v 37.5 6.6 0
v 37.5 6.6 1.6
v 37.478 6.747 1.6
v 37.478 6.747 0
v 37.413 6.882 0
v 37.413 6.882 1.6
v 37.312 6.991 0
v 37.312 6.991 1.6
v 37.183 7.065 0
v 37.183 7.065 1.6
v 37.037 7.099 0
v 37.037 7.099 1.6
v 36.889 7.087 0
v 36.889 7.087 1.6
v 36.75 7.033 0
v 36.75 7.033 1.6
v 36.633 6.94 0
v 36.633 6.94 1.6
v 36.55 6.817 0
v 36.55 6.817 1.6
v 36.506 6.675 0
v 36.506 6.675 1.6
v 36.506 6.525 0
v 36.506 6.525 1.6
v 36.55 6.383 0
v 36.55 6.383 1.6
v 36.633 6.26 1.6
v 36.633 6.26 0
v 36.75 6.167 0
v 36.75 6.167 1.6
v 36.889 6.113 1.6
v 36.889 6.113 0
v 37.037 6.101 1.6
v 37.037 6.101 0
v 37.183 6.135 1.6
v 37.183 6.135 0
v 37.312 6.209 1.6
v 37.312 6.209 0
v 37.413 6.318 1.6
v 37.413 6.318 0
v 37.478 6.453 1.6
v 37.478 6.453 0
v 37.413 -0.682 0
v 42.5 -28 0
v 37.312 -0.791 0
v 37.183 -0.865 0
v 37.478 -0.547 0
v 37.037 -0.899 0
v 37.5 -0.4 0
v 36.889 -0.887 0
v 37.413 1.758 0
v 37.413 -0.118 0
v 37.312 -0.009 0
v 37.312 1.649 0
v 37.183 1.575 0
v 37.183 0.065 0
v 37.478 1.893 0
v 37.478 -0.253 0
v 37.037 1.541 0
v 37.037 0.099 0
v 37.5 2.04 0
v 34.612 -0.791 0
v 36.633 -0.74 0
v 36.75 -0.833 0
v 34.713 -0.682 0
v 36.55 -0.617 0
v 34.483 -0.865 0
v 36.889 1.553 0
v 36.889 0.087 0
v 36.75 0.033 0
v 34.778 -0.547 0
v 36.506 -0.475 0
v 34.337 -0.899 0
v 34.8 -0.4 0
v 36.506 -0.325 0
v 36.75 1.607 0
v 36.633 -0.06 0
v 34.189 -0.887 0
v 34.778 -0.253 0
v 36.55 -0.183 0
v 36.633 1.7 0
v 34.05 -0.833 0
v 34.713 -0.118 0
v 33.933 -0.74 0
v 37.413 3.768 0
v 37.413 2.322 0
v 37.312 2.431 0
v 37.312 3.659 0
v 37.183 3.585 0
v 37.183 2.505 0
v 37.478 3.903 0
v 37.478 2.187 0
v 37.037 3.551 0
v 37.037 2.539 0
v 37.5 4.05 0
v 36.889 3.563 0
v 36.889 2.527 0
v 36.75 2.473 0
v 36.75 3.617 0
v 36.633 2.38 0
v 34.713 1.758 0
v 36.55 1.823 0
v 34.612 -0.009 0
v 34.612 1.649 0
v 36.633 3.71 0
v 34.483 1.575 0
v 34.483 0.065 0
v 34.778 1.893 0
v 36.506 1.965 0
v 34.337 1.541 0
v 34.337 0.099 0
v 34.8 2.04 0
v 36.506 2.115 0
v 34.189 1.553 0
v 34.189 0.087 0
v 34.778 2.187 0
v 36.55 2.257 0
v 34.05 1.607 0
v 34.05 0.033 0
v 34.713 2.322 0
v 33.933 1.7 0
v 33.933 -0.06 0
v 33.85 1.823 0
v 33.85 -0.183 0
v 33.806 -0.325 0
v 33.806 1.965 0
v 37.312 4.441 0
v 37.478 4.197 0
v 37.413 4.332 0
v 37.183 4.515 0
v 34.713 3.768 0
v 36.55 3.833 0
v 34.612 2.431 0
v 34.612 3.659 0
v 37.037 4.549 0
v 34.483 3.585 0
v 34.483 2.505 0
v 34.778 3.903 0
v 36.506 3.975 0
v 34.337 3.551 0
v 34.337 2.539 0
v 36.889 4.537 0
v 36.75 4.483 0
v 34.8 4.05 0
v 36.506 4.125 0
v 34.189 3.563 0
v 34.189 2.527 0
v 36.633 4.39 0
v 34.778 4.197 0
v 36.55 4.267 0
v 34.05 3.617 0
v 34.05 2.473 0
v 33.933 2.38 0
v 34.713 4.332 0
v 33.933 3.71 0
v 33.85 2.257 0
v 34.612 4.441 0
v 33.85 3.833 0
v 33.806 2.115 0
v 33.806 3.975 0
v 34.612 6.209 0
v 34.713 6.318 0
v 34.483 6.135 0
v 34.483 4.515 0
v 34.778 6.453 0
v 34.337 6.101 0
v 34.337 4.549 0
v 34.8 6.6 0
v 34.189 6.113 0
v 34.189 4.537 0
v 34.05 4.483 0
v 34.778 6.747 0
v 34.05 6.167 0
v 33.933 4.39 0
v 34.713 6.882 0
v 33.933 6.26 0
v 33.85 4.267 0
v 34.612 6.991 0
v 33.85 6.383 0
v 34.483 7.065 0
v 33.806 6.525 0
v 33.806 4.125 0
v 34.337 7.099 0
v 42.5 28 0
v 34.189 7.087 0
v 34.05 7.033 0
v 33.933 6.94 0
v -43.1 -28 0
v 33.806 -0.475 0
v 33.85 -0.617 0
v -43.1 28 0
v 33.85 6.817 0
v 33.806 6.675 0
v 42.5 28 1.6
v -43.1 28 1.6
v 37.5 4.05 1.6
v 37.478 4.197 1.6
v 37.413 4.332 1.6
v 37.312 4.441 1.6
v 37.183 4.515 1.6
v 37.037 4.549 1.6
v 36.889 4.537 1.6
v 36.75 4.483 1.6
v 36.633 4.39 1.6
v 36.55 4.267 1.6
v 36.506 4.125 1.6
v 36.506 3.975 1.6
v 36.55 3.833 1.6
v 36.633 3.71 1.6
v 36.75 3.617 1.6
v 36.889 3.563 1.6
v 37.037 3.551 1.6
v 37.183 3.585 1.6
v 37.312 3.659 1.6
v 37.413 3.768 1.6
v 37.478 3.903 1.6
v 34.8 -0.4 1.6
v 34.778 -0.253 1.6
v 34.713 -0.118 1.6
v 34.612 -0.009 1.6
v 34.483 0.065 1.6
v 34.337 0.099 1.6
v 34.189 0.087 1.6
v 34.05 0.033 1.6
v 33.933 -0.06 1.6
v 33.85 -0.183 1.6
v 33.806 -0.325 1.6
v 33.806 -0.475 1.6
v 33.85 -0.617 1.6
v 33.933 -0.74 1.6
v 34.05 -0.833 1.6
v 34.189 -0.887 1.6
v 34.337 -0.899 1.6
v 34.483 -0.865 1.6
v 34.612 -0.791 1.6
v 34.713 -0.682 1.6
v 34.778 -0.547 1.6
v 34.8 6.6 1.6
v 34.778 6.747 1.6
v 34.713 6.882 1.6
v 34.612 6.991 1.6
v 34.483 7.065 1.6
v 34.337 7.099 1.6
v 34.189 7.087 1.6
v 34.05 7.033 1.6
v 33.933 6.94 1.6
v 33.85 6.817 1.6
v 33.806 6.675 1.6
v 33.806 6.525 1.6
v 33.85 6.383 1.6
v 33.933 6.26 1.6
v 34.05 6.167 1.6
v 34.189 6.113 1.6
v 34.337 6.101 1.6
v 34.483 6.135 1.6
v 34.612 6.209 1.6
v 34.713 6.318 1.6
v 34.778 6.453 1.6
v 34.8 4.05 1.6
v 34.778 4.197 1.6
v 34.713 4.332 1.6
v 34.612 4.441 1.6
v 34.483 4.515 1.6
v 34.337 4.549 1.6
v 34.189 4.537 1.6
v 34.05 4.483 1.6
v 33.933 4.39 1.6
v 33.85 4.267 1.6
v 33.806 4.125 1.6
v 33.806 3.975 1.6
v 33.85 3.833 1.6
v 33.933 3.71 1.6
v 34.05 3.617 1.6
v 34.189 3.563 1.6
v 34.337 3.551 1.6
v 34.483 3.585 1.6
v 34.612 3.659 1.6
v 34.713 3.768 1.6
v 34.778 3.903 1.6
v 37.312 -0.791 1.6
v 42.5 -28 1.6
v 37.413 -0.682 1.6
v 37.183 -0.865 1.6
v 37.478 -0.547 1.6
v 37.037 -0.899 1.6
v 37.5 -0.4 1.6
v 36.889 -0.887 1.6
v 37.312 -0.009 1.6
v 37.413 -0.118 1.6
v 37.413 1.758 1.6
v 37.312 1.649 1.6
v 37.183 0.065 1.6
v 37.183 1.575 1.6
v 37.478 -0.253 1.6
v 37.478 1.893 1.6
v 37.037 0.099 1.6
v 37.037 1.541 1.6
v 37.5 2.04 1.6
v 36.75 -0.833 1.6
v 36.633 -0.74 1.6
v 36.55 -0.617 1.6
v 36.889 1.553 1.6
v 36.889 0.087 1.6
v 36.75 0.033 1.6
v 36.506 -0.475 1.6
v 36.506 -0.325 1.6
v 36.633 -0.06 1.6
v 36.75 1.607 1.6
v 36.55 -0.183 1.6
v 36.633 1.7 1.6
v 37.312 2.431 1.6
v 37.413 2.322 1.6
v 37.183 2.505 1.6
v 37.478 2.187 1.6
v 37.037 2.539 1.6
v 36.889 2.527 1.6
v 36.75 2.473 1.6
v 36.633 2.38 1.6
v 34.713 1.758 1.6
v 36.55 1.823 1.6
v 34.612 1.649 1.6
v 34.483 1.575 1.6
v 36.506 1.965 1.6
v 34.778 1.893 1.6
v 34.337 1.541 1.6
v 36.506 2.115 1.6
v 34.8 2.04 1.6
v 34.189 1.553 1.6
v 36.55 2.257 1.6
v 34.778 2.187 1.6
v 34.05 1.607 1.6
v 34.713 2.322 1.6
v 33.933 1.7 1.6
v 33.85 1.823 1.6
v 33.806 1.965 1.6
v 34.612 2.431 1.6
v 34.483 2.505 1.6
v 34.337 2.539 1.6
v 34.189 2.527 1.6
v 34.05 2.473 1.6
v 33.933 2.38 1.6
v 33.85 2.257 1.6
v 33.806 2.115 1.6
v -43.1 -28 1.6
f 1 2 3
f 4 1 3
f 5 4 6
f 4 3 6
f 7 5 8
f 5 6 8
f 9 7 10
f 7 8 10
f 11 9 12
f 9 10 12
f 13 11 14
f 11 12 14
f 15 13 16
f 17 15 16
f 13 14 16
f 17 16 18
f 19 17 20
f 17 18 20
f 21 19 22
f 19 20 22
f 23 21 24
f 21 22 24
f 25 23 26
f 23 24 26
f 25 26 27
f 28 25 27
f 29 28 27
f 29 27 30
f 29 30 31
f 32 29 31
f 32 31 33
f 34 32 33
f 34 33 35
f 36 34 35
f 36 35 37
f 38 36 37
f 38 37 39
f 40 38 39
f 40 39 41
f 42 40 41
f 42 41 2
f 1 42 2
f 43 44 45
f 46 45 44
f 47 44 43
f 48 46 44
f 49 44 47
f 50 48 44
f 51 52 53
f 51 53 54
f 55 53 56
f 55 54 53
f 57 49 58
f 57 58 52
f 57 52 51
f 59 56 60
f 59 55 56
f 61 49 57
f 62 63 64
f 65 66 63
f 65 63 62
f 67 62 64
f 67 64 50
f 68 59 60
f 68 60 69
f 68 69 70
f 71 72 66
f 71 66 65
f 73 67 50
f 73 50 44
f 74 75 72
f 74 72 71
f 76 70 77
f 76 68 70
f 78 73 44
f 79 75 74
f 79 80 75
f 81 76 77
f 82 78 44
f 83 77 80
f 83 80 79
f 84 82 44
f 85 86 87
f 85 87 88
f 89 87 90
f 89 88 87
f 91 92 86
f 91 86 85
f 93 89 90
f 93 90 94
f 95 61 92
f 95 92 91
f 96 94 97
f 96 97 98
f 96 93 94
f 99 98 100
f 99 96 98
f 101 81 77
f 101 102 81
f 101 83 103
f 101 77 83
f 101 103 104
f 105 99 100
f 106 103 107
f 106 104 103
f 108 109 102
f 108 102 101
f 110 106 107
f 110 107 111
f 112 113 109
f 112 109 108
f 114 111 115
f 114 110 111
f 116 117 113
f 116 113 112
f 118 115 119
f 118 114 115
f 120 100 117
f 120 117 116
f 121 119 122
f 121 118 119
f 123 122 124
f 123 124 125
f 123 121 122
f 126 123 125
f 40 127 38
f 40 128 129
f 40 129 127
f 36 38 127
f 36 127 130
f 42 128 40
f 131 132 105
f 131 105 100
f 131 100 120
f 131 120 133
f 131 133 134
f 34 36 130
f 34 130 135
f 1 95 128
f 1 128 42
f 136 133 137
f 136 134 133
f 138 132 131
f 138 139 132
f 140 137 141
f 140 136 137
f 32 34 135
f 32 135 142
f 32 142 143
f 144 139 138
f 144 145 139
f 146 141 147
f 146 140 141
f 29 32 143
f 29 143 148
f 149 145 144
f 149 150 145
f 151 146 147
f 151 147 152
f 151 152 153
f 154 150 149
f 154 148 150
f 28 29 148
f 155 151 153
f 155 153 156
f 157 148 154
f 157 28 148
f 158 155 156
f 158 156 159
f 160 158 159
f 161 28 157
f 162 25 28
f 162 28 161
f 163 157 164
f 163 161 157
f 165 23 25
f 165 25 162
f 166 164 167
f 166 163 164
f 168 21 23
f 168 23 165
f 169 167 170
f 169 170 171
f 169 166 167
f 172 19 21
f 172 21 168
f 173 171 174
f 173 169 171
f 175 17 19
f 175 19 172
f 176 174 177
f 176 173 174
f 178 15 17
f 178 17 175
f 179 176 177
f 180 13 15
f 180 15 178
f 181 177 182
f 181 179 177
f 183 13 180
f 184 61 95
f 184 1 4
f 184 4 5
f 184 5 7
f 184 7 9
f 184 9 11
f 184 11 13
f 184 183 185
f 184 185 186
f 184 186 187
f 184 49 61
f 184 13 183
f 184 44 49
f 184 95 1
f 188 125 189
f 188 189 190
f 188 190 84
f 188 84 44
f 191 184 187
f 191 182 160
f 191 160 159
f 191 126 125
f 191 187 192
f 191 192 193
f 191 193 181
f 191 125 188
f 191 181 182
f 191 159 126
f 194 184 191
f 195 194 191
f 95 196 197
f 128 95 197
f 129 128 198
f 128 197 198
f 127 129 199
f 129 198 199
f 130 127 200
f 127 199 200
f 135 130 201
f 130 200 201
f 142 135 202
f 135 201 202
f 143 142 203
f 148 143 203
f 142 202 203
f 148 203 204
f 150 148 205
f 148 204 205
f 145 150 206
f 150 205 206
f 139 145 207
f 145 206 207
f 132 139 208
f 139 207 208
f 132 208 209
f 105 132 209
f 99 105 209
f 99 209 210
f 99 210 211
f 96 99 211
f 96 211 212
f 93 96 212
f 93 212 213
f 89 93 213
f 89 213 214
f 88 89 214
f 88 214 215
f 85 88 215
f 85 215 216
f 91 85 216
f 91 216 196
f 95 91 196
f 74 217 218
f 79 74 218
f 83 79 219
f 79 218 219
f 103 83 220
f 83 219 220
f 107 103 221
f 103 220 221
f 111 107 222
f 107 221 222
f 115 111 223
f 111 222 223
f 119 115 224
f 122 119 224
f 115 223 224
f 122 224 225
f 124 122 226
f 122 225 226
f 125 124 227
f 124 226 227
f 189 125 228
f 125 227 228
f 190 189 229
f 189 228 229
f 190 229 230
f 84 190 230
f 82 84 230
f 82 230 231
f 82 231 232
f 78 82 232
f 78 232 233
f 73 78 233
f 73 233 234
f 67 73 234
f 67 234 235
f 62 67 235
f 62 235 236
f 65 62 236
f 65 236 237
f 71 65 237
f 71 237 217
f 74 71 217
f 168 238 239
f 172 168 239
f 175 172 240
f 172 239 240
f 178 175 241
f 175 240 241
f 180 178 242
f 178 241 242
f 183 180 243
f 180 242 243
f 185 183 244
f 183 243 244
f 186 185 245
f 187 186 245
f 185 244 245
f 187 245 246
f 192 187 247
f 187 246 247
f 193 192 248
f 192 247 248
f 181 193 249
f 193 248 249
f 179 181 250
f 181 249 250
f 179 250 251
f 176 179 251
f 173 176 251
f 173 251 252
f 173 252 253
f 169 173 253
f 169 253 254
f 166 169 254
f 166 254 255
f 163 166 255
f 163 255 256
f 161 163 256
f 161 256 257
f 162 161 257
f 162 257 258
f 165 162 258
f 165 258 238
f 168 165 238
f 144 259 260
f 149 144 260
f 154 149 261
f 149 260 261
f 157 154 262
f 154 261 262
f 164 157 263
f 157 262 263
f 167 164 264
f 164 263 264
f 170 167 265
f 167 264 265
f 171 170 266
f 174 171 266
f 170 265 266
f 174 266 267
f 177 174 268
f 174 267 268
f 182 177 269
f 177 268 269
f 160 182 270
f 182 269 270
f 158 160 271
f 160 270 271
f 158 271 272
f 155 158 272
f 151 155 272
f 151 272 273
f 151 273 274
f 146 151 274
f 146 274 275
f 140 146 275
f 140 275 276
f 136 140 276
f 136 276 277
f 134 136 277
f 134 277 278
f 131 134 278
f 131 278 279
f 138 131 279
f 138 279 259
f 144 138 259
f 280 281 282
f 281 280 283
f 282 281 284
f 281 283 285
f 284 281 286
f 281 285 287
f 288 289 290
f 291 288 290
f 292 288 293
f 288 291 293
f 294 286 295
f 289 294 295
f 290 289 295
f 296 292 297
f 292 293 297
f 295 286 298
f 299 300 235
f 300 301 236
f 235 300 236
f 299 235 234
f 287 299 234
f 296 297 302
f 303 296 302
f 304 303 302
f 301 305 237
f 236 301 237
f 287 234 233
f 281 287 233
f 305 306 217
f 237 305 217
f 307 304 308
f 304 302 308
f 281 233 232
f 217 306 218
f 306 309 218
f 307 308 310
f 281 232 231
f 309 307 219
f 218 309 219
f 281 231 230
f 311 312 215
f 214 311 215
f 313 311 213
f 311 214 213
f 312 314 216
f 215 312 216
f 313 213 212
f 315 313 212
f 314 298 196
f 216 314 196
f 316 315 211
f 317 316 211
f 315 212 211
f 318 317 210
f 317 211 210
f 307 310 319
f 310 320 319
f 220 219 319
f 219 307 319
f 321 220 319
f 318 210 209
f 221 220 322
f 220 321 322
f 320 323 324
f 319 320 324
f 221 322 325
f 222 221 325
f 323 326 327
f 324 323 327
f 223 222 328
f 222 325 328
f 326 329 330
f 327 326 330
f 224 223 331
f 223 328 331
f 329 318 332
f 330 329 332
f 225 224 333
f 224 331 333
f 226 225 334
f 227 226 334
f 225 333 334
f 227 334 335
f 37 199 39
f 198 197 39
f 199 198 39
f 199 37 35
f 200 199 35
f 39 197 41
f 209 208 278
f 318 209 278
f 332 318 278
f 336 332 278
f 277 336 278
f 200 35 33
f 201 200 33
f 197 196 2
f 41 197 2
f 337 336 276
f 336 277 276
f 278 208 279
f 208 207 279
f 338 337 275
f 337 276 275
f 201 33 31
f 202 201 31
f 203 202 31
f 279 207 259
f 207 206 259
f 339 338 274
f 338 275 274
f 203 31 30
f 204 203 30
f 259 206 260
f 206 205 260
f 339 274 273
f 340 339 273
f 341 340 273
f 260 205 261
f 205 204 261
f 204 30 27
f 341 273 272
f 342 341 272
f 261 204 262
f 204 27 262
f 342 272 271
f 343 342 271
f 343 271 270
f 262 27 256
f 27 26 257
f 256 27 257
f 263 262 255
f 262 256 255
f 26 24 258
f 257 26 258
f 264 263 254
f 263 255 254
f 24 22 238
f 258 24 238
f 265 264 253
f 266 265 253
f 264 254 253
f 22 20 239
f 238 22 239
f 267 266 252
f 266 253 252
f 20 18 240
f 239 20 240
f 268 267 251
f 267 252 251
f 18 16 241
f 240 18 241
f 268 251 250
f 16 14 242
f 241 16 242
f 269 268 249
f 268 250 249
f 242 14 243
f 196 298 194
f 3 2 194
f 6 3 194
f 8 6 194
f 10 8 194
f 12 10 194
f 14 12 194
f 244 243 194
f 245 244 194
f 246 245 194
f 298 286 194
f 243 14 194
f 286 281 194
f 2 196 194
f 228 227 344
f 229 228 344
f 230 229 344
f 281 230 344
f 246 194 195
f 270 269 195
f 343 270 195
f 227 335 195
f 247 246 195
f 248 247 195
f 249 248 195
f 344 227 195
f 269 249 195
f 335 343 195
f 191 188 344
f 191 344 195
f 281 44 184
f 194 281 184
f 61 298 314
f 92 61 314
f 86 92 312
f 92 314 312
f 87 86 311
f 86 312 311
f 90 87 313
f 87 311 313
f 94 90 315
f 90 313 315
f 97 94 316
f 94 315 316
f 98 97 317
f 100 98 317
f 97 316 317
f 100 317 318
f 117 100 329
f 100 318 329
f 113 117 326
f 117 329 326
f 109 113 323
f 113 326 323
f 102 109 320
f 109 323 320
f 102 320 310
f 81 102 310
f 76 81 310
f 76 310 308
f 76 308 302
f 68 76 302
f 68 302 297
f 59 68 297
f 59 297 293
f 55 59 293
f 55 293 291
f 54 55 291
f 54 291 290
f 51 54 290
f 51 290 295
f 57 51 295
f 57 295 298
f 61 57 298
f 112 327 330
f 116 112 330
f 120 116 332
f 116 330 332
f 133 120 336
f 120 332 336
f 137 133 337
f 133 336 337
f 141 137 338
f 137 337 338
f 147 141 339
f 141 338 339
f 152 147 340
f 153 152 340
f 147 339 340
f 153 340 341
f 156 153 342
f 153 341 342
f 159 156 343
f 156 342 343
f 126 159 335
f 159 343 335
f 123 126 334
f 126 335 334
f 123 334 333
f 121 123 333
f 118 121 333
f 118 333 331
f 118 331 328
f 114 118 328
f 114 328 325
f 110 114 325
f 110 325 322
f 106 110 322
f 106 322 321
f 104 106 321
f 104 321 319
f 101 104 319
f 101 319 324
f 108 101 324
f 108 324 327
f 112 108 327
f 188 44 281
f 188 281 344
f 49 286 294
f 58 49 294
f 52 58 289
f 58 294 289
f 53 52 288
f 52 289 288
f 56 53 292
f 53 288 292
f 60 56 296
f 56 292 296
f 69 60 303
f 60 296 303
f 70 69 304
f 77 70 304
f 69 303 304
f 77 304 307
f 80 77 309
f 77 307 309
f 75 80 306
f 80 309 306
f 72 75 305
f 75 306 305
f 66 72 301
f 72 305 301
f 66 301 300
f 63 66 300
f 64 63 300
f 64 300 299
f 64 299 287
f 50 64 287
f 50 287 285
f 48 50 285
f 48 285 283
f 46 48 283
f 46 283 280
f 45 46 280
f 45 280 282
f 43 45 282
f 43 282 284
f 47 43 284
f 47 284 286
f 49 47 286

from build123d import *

# Parameters (mm, degrees)
ESBO_O1_W                = 85.6
ESBO_O1_H                = 56
RESSALTO_EXTRUS_O1_DEPTH = 1.6
ESBO_O2_R                = 0.5
CORTE_EXTRUS_O1_DEPTH    = 2


with BuildPart() as part:
    # Esboço1 → Ressalto-extrusão1 (new body)
    with BuildSketch(Plane(origin=(0, 0, 0), x_dir=(-1, 0, 0), z_dir=(0, 0, -1))):
        with Locations((0.3, 0)):
            Rectangle(ESBO_O1_W, ESBO_O1_H)
    extrude(amount=-RESSALTO_EXTRUS_O1_DEPTH)

    # Esboço2 → Corte-extrusão1 (cut)
    with BuildSketch(Plane.XY.offset(1.6)):
        with Locations((37, 6.6)):
            Circle(ESBO_O2_R)
        with Locations((34.3, 6.6)):
            Circle(ESBO_O2_R)
        with Locations((34.3, 4.05)):
            Circle(ESBO_O2_R)
        with Locations((34.3, 2.04)):
            Circle(ESBO_O2_R)
        with Locations((34.3, -0.4)):
            Circle(ESBO_O2_R)
        with Locations((37, 4.05)):
            Circle(ESBO_O2_R)
        with Locations((37, 2.04)):
            Circle(ESBO_O2_R)
        with Locations((37, -0.4)):
            Circle(ESBO_O2_R)
    extrude(amount=-CORTE_EXTRUS_O1_DEPTH, mode=Mode.SUBTRACT)


solid = part.part
